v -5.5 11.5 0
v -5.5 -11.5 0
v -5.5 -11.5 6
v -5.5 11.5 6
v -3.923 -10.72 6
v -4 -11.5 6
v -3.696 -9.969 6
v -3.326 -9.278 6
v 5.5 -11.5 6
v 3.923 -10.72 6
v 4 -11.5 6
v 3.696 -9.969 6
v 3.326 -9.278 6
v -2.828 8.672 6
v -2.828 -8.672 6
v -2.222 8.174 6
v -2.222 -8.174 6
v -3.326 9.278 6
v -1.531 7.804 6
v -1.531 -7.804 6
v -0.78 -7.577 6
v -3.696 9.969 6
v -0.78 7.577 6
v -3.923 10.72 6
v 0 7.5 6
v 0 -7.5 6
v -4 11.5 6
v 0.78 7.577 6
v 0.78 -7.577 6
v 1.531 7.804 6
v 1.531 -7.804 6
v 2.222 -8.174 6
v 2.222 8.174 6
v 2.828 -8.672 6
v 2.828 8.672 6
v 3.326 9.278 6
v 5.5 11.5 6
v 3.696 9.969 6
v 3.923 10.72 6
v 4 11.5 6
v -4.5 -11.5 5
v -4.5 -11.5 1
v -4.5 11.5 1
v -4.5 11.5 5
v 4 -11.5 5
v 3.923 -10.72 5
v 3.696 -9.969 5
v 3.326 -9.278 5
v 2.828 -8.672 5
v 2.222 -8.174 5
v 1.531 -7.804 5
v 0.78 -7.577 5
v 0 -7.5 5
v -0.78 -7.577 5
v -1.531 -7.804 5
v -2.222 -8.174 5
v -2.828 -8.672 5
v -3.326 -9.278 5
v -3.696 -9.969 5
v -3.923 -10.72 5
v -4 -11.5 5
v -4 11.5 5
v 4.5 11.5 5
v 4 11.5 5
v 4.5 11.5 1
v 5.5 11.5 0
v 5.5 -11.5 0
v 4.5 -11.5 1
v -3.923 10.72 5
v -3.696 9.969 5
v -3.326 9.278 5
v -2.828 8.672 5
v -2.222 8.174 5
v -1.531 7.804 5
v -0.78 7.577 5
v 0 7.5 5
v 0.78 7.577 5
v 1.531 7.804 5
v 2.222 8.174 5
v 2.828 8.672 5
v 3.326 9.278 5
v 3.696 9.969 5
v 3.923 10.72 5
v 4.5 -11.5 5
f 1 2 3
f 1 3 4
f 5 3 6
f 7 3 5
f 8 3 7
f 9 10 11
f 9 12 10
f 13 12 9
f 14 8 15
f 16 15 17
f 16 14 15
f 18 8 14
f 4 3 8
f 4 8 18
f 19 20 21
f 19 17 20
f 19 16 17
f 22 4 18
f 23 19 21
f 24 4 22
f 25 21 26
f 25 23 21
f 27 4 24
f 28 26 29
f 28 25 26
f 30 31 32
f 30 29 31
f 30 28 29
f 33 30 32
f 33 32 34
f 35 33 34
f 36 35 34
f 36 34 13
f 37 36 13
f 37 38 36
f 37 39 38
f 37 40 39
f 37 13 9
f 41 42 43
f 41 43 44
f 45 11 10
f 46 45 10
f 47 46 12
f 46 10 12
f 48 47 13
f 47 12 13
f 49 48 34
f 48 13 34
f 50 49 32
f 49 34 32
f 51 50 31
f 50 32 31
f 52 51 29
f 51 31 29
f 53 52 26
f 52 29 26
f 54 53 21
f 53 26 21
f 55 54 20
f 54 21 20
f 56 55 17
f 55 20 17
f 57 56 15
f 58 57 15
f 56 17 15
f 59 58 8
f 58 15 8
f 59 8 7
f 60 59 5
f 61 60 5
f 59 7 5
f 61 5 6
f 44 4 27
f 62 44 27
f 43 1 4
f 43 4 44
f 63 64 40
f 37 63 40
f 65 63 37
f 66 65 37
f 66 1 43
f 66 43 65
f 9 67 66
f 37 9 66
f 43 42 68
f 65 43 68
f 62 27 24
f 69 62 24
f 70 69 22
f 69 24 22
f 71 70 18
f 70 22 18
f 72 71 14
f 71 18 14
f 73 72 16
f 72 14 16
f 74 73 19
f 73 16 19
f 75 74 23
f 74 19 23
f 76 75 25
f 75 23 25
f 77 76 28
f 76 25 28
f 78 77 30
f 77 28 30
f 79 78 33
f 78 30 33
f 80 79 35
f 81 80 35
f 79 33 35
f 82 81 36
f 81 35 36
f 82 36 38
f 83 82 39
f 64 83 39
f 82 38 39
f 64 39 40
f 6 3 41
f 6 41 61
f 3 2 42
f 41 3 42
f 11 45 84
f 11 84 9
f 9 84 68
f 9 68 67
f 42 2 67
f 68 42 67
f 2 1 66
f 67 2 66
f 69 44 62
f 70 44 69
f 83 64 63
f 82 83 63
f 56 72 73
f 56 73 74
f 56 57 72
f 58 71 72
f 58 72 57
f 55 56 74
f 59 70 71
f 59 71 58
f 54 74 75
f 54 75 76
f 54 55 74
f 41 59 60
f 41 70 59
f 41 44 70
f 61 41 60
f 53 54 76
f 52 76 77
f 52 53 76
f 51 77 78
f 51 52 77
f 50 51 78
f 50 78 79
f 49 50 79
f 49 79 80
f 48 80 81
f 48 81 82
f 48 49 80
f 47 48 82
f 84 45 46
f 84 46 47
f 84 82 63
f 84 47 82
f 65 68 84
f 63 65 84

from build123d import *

# Parameters (mm, degrees)
F0_W     = 11
F0_H     = 23
F1_DEPTH = 6
F2_W     = 9
F2_H     = 4
F3_DEPTH = 23.001
F5_DEPTH = 1.5


with BuildPart() as f1:
    # F0 (on Top) → F1 (new body)
    with BuildSketch(Plane.XY):
        Rectangle(F0_W, F0_H)
    extrude(amount=F1_DEPTH)

    # F2 (on face) → F3 (cut, through all)
    with BuildSketch(Plane.XZ.offset(11.5)):
        with Locations((0, 3)):
            Rectangle(F2_W, F2_H)
    extrude(amount=-F3_DEPTH, mode=Mode.SUBTRACT)

    # F4 (on face) → F5 (cut)
    with BuildSketch(Plane.XY.offset(6)):
        with BuildLine():
            Line((4, 11.5), (-4, 11.5))
            ThreePointArc((-4, 11.5), (0, 7.5), (4, 11.5))
        make_face()
        with BuildLine():
            ThreePointArc((4, -11.5), (0, -7.5), (-4, -11.5))
            Line((-4, -11.5), (4, -11.5))
        make_face()
    extrude(amount=-F5_DEPTH, mode=Mode.SUBTRACT)


solid = f1.part
